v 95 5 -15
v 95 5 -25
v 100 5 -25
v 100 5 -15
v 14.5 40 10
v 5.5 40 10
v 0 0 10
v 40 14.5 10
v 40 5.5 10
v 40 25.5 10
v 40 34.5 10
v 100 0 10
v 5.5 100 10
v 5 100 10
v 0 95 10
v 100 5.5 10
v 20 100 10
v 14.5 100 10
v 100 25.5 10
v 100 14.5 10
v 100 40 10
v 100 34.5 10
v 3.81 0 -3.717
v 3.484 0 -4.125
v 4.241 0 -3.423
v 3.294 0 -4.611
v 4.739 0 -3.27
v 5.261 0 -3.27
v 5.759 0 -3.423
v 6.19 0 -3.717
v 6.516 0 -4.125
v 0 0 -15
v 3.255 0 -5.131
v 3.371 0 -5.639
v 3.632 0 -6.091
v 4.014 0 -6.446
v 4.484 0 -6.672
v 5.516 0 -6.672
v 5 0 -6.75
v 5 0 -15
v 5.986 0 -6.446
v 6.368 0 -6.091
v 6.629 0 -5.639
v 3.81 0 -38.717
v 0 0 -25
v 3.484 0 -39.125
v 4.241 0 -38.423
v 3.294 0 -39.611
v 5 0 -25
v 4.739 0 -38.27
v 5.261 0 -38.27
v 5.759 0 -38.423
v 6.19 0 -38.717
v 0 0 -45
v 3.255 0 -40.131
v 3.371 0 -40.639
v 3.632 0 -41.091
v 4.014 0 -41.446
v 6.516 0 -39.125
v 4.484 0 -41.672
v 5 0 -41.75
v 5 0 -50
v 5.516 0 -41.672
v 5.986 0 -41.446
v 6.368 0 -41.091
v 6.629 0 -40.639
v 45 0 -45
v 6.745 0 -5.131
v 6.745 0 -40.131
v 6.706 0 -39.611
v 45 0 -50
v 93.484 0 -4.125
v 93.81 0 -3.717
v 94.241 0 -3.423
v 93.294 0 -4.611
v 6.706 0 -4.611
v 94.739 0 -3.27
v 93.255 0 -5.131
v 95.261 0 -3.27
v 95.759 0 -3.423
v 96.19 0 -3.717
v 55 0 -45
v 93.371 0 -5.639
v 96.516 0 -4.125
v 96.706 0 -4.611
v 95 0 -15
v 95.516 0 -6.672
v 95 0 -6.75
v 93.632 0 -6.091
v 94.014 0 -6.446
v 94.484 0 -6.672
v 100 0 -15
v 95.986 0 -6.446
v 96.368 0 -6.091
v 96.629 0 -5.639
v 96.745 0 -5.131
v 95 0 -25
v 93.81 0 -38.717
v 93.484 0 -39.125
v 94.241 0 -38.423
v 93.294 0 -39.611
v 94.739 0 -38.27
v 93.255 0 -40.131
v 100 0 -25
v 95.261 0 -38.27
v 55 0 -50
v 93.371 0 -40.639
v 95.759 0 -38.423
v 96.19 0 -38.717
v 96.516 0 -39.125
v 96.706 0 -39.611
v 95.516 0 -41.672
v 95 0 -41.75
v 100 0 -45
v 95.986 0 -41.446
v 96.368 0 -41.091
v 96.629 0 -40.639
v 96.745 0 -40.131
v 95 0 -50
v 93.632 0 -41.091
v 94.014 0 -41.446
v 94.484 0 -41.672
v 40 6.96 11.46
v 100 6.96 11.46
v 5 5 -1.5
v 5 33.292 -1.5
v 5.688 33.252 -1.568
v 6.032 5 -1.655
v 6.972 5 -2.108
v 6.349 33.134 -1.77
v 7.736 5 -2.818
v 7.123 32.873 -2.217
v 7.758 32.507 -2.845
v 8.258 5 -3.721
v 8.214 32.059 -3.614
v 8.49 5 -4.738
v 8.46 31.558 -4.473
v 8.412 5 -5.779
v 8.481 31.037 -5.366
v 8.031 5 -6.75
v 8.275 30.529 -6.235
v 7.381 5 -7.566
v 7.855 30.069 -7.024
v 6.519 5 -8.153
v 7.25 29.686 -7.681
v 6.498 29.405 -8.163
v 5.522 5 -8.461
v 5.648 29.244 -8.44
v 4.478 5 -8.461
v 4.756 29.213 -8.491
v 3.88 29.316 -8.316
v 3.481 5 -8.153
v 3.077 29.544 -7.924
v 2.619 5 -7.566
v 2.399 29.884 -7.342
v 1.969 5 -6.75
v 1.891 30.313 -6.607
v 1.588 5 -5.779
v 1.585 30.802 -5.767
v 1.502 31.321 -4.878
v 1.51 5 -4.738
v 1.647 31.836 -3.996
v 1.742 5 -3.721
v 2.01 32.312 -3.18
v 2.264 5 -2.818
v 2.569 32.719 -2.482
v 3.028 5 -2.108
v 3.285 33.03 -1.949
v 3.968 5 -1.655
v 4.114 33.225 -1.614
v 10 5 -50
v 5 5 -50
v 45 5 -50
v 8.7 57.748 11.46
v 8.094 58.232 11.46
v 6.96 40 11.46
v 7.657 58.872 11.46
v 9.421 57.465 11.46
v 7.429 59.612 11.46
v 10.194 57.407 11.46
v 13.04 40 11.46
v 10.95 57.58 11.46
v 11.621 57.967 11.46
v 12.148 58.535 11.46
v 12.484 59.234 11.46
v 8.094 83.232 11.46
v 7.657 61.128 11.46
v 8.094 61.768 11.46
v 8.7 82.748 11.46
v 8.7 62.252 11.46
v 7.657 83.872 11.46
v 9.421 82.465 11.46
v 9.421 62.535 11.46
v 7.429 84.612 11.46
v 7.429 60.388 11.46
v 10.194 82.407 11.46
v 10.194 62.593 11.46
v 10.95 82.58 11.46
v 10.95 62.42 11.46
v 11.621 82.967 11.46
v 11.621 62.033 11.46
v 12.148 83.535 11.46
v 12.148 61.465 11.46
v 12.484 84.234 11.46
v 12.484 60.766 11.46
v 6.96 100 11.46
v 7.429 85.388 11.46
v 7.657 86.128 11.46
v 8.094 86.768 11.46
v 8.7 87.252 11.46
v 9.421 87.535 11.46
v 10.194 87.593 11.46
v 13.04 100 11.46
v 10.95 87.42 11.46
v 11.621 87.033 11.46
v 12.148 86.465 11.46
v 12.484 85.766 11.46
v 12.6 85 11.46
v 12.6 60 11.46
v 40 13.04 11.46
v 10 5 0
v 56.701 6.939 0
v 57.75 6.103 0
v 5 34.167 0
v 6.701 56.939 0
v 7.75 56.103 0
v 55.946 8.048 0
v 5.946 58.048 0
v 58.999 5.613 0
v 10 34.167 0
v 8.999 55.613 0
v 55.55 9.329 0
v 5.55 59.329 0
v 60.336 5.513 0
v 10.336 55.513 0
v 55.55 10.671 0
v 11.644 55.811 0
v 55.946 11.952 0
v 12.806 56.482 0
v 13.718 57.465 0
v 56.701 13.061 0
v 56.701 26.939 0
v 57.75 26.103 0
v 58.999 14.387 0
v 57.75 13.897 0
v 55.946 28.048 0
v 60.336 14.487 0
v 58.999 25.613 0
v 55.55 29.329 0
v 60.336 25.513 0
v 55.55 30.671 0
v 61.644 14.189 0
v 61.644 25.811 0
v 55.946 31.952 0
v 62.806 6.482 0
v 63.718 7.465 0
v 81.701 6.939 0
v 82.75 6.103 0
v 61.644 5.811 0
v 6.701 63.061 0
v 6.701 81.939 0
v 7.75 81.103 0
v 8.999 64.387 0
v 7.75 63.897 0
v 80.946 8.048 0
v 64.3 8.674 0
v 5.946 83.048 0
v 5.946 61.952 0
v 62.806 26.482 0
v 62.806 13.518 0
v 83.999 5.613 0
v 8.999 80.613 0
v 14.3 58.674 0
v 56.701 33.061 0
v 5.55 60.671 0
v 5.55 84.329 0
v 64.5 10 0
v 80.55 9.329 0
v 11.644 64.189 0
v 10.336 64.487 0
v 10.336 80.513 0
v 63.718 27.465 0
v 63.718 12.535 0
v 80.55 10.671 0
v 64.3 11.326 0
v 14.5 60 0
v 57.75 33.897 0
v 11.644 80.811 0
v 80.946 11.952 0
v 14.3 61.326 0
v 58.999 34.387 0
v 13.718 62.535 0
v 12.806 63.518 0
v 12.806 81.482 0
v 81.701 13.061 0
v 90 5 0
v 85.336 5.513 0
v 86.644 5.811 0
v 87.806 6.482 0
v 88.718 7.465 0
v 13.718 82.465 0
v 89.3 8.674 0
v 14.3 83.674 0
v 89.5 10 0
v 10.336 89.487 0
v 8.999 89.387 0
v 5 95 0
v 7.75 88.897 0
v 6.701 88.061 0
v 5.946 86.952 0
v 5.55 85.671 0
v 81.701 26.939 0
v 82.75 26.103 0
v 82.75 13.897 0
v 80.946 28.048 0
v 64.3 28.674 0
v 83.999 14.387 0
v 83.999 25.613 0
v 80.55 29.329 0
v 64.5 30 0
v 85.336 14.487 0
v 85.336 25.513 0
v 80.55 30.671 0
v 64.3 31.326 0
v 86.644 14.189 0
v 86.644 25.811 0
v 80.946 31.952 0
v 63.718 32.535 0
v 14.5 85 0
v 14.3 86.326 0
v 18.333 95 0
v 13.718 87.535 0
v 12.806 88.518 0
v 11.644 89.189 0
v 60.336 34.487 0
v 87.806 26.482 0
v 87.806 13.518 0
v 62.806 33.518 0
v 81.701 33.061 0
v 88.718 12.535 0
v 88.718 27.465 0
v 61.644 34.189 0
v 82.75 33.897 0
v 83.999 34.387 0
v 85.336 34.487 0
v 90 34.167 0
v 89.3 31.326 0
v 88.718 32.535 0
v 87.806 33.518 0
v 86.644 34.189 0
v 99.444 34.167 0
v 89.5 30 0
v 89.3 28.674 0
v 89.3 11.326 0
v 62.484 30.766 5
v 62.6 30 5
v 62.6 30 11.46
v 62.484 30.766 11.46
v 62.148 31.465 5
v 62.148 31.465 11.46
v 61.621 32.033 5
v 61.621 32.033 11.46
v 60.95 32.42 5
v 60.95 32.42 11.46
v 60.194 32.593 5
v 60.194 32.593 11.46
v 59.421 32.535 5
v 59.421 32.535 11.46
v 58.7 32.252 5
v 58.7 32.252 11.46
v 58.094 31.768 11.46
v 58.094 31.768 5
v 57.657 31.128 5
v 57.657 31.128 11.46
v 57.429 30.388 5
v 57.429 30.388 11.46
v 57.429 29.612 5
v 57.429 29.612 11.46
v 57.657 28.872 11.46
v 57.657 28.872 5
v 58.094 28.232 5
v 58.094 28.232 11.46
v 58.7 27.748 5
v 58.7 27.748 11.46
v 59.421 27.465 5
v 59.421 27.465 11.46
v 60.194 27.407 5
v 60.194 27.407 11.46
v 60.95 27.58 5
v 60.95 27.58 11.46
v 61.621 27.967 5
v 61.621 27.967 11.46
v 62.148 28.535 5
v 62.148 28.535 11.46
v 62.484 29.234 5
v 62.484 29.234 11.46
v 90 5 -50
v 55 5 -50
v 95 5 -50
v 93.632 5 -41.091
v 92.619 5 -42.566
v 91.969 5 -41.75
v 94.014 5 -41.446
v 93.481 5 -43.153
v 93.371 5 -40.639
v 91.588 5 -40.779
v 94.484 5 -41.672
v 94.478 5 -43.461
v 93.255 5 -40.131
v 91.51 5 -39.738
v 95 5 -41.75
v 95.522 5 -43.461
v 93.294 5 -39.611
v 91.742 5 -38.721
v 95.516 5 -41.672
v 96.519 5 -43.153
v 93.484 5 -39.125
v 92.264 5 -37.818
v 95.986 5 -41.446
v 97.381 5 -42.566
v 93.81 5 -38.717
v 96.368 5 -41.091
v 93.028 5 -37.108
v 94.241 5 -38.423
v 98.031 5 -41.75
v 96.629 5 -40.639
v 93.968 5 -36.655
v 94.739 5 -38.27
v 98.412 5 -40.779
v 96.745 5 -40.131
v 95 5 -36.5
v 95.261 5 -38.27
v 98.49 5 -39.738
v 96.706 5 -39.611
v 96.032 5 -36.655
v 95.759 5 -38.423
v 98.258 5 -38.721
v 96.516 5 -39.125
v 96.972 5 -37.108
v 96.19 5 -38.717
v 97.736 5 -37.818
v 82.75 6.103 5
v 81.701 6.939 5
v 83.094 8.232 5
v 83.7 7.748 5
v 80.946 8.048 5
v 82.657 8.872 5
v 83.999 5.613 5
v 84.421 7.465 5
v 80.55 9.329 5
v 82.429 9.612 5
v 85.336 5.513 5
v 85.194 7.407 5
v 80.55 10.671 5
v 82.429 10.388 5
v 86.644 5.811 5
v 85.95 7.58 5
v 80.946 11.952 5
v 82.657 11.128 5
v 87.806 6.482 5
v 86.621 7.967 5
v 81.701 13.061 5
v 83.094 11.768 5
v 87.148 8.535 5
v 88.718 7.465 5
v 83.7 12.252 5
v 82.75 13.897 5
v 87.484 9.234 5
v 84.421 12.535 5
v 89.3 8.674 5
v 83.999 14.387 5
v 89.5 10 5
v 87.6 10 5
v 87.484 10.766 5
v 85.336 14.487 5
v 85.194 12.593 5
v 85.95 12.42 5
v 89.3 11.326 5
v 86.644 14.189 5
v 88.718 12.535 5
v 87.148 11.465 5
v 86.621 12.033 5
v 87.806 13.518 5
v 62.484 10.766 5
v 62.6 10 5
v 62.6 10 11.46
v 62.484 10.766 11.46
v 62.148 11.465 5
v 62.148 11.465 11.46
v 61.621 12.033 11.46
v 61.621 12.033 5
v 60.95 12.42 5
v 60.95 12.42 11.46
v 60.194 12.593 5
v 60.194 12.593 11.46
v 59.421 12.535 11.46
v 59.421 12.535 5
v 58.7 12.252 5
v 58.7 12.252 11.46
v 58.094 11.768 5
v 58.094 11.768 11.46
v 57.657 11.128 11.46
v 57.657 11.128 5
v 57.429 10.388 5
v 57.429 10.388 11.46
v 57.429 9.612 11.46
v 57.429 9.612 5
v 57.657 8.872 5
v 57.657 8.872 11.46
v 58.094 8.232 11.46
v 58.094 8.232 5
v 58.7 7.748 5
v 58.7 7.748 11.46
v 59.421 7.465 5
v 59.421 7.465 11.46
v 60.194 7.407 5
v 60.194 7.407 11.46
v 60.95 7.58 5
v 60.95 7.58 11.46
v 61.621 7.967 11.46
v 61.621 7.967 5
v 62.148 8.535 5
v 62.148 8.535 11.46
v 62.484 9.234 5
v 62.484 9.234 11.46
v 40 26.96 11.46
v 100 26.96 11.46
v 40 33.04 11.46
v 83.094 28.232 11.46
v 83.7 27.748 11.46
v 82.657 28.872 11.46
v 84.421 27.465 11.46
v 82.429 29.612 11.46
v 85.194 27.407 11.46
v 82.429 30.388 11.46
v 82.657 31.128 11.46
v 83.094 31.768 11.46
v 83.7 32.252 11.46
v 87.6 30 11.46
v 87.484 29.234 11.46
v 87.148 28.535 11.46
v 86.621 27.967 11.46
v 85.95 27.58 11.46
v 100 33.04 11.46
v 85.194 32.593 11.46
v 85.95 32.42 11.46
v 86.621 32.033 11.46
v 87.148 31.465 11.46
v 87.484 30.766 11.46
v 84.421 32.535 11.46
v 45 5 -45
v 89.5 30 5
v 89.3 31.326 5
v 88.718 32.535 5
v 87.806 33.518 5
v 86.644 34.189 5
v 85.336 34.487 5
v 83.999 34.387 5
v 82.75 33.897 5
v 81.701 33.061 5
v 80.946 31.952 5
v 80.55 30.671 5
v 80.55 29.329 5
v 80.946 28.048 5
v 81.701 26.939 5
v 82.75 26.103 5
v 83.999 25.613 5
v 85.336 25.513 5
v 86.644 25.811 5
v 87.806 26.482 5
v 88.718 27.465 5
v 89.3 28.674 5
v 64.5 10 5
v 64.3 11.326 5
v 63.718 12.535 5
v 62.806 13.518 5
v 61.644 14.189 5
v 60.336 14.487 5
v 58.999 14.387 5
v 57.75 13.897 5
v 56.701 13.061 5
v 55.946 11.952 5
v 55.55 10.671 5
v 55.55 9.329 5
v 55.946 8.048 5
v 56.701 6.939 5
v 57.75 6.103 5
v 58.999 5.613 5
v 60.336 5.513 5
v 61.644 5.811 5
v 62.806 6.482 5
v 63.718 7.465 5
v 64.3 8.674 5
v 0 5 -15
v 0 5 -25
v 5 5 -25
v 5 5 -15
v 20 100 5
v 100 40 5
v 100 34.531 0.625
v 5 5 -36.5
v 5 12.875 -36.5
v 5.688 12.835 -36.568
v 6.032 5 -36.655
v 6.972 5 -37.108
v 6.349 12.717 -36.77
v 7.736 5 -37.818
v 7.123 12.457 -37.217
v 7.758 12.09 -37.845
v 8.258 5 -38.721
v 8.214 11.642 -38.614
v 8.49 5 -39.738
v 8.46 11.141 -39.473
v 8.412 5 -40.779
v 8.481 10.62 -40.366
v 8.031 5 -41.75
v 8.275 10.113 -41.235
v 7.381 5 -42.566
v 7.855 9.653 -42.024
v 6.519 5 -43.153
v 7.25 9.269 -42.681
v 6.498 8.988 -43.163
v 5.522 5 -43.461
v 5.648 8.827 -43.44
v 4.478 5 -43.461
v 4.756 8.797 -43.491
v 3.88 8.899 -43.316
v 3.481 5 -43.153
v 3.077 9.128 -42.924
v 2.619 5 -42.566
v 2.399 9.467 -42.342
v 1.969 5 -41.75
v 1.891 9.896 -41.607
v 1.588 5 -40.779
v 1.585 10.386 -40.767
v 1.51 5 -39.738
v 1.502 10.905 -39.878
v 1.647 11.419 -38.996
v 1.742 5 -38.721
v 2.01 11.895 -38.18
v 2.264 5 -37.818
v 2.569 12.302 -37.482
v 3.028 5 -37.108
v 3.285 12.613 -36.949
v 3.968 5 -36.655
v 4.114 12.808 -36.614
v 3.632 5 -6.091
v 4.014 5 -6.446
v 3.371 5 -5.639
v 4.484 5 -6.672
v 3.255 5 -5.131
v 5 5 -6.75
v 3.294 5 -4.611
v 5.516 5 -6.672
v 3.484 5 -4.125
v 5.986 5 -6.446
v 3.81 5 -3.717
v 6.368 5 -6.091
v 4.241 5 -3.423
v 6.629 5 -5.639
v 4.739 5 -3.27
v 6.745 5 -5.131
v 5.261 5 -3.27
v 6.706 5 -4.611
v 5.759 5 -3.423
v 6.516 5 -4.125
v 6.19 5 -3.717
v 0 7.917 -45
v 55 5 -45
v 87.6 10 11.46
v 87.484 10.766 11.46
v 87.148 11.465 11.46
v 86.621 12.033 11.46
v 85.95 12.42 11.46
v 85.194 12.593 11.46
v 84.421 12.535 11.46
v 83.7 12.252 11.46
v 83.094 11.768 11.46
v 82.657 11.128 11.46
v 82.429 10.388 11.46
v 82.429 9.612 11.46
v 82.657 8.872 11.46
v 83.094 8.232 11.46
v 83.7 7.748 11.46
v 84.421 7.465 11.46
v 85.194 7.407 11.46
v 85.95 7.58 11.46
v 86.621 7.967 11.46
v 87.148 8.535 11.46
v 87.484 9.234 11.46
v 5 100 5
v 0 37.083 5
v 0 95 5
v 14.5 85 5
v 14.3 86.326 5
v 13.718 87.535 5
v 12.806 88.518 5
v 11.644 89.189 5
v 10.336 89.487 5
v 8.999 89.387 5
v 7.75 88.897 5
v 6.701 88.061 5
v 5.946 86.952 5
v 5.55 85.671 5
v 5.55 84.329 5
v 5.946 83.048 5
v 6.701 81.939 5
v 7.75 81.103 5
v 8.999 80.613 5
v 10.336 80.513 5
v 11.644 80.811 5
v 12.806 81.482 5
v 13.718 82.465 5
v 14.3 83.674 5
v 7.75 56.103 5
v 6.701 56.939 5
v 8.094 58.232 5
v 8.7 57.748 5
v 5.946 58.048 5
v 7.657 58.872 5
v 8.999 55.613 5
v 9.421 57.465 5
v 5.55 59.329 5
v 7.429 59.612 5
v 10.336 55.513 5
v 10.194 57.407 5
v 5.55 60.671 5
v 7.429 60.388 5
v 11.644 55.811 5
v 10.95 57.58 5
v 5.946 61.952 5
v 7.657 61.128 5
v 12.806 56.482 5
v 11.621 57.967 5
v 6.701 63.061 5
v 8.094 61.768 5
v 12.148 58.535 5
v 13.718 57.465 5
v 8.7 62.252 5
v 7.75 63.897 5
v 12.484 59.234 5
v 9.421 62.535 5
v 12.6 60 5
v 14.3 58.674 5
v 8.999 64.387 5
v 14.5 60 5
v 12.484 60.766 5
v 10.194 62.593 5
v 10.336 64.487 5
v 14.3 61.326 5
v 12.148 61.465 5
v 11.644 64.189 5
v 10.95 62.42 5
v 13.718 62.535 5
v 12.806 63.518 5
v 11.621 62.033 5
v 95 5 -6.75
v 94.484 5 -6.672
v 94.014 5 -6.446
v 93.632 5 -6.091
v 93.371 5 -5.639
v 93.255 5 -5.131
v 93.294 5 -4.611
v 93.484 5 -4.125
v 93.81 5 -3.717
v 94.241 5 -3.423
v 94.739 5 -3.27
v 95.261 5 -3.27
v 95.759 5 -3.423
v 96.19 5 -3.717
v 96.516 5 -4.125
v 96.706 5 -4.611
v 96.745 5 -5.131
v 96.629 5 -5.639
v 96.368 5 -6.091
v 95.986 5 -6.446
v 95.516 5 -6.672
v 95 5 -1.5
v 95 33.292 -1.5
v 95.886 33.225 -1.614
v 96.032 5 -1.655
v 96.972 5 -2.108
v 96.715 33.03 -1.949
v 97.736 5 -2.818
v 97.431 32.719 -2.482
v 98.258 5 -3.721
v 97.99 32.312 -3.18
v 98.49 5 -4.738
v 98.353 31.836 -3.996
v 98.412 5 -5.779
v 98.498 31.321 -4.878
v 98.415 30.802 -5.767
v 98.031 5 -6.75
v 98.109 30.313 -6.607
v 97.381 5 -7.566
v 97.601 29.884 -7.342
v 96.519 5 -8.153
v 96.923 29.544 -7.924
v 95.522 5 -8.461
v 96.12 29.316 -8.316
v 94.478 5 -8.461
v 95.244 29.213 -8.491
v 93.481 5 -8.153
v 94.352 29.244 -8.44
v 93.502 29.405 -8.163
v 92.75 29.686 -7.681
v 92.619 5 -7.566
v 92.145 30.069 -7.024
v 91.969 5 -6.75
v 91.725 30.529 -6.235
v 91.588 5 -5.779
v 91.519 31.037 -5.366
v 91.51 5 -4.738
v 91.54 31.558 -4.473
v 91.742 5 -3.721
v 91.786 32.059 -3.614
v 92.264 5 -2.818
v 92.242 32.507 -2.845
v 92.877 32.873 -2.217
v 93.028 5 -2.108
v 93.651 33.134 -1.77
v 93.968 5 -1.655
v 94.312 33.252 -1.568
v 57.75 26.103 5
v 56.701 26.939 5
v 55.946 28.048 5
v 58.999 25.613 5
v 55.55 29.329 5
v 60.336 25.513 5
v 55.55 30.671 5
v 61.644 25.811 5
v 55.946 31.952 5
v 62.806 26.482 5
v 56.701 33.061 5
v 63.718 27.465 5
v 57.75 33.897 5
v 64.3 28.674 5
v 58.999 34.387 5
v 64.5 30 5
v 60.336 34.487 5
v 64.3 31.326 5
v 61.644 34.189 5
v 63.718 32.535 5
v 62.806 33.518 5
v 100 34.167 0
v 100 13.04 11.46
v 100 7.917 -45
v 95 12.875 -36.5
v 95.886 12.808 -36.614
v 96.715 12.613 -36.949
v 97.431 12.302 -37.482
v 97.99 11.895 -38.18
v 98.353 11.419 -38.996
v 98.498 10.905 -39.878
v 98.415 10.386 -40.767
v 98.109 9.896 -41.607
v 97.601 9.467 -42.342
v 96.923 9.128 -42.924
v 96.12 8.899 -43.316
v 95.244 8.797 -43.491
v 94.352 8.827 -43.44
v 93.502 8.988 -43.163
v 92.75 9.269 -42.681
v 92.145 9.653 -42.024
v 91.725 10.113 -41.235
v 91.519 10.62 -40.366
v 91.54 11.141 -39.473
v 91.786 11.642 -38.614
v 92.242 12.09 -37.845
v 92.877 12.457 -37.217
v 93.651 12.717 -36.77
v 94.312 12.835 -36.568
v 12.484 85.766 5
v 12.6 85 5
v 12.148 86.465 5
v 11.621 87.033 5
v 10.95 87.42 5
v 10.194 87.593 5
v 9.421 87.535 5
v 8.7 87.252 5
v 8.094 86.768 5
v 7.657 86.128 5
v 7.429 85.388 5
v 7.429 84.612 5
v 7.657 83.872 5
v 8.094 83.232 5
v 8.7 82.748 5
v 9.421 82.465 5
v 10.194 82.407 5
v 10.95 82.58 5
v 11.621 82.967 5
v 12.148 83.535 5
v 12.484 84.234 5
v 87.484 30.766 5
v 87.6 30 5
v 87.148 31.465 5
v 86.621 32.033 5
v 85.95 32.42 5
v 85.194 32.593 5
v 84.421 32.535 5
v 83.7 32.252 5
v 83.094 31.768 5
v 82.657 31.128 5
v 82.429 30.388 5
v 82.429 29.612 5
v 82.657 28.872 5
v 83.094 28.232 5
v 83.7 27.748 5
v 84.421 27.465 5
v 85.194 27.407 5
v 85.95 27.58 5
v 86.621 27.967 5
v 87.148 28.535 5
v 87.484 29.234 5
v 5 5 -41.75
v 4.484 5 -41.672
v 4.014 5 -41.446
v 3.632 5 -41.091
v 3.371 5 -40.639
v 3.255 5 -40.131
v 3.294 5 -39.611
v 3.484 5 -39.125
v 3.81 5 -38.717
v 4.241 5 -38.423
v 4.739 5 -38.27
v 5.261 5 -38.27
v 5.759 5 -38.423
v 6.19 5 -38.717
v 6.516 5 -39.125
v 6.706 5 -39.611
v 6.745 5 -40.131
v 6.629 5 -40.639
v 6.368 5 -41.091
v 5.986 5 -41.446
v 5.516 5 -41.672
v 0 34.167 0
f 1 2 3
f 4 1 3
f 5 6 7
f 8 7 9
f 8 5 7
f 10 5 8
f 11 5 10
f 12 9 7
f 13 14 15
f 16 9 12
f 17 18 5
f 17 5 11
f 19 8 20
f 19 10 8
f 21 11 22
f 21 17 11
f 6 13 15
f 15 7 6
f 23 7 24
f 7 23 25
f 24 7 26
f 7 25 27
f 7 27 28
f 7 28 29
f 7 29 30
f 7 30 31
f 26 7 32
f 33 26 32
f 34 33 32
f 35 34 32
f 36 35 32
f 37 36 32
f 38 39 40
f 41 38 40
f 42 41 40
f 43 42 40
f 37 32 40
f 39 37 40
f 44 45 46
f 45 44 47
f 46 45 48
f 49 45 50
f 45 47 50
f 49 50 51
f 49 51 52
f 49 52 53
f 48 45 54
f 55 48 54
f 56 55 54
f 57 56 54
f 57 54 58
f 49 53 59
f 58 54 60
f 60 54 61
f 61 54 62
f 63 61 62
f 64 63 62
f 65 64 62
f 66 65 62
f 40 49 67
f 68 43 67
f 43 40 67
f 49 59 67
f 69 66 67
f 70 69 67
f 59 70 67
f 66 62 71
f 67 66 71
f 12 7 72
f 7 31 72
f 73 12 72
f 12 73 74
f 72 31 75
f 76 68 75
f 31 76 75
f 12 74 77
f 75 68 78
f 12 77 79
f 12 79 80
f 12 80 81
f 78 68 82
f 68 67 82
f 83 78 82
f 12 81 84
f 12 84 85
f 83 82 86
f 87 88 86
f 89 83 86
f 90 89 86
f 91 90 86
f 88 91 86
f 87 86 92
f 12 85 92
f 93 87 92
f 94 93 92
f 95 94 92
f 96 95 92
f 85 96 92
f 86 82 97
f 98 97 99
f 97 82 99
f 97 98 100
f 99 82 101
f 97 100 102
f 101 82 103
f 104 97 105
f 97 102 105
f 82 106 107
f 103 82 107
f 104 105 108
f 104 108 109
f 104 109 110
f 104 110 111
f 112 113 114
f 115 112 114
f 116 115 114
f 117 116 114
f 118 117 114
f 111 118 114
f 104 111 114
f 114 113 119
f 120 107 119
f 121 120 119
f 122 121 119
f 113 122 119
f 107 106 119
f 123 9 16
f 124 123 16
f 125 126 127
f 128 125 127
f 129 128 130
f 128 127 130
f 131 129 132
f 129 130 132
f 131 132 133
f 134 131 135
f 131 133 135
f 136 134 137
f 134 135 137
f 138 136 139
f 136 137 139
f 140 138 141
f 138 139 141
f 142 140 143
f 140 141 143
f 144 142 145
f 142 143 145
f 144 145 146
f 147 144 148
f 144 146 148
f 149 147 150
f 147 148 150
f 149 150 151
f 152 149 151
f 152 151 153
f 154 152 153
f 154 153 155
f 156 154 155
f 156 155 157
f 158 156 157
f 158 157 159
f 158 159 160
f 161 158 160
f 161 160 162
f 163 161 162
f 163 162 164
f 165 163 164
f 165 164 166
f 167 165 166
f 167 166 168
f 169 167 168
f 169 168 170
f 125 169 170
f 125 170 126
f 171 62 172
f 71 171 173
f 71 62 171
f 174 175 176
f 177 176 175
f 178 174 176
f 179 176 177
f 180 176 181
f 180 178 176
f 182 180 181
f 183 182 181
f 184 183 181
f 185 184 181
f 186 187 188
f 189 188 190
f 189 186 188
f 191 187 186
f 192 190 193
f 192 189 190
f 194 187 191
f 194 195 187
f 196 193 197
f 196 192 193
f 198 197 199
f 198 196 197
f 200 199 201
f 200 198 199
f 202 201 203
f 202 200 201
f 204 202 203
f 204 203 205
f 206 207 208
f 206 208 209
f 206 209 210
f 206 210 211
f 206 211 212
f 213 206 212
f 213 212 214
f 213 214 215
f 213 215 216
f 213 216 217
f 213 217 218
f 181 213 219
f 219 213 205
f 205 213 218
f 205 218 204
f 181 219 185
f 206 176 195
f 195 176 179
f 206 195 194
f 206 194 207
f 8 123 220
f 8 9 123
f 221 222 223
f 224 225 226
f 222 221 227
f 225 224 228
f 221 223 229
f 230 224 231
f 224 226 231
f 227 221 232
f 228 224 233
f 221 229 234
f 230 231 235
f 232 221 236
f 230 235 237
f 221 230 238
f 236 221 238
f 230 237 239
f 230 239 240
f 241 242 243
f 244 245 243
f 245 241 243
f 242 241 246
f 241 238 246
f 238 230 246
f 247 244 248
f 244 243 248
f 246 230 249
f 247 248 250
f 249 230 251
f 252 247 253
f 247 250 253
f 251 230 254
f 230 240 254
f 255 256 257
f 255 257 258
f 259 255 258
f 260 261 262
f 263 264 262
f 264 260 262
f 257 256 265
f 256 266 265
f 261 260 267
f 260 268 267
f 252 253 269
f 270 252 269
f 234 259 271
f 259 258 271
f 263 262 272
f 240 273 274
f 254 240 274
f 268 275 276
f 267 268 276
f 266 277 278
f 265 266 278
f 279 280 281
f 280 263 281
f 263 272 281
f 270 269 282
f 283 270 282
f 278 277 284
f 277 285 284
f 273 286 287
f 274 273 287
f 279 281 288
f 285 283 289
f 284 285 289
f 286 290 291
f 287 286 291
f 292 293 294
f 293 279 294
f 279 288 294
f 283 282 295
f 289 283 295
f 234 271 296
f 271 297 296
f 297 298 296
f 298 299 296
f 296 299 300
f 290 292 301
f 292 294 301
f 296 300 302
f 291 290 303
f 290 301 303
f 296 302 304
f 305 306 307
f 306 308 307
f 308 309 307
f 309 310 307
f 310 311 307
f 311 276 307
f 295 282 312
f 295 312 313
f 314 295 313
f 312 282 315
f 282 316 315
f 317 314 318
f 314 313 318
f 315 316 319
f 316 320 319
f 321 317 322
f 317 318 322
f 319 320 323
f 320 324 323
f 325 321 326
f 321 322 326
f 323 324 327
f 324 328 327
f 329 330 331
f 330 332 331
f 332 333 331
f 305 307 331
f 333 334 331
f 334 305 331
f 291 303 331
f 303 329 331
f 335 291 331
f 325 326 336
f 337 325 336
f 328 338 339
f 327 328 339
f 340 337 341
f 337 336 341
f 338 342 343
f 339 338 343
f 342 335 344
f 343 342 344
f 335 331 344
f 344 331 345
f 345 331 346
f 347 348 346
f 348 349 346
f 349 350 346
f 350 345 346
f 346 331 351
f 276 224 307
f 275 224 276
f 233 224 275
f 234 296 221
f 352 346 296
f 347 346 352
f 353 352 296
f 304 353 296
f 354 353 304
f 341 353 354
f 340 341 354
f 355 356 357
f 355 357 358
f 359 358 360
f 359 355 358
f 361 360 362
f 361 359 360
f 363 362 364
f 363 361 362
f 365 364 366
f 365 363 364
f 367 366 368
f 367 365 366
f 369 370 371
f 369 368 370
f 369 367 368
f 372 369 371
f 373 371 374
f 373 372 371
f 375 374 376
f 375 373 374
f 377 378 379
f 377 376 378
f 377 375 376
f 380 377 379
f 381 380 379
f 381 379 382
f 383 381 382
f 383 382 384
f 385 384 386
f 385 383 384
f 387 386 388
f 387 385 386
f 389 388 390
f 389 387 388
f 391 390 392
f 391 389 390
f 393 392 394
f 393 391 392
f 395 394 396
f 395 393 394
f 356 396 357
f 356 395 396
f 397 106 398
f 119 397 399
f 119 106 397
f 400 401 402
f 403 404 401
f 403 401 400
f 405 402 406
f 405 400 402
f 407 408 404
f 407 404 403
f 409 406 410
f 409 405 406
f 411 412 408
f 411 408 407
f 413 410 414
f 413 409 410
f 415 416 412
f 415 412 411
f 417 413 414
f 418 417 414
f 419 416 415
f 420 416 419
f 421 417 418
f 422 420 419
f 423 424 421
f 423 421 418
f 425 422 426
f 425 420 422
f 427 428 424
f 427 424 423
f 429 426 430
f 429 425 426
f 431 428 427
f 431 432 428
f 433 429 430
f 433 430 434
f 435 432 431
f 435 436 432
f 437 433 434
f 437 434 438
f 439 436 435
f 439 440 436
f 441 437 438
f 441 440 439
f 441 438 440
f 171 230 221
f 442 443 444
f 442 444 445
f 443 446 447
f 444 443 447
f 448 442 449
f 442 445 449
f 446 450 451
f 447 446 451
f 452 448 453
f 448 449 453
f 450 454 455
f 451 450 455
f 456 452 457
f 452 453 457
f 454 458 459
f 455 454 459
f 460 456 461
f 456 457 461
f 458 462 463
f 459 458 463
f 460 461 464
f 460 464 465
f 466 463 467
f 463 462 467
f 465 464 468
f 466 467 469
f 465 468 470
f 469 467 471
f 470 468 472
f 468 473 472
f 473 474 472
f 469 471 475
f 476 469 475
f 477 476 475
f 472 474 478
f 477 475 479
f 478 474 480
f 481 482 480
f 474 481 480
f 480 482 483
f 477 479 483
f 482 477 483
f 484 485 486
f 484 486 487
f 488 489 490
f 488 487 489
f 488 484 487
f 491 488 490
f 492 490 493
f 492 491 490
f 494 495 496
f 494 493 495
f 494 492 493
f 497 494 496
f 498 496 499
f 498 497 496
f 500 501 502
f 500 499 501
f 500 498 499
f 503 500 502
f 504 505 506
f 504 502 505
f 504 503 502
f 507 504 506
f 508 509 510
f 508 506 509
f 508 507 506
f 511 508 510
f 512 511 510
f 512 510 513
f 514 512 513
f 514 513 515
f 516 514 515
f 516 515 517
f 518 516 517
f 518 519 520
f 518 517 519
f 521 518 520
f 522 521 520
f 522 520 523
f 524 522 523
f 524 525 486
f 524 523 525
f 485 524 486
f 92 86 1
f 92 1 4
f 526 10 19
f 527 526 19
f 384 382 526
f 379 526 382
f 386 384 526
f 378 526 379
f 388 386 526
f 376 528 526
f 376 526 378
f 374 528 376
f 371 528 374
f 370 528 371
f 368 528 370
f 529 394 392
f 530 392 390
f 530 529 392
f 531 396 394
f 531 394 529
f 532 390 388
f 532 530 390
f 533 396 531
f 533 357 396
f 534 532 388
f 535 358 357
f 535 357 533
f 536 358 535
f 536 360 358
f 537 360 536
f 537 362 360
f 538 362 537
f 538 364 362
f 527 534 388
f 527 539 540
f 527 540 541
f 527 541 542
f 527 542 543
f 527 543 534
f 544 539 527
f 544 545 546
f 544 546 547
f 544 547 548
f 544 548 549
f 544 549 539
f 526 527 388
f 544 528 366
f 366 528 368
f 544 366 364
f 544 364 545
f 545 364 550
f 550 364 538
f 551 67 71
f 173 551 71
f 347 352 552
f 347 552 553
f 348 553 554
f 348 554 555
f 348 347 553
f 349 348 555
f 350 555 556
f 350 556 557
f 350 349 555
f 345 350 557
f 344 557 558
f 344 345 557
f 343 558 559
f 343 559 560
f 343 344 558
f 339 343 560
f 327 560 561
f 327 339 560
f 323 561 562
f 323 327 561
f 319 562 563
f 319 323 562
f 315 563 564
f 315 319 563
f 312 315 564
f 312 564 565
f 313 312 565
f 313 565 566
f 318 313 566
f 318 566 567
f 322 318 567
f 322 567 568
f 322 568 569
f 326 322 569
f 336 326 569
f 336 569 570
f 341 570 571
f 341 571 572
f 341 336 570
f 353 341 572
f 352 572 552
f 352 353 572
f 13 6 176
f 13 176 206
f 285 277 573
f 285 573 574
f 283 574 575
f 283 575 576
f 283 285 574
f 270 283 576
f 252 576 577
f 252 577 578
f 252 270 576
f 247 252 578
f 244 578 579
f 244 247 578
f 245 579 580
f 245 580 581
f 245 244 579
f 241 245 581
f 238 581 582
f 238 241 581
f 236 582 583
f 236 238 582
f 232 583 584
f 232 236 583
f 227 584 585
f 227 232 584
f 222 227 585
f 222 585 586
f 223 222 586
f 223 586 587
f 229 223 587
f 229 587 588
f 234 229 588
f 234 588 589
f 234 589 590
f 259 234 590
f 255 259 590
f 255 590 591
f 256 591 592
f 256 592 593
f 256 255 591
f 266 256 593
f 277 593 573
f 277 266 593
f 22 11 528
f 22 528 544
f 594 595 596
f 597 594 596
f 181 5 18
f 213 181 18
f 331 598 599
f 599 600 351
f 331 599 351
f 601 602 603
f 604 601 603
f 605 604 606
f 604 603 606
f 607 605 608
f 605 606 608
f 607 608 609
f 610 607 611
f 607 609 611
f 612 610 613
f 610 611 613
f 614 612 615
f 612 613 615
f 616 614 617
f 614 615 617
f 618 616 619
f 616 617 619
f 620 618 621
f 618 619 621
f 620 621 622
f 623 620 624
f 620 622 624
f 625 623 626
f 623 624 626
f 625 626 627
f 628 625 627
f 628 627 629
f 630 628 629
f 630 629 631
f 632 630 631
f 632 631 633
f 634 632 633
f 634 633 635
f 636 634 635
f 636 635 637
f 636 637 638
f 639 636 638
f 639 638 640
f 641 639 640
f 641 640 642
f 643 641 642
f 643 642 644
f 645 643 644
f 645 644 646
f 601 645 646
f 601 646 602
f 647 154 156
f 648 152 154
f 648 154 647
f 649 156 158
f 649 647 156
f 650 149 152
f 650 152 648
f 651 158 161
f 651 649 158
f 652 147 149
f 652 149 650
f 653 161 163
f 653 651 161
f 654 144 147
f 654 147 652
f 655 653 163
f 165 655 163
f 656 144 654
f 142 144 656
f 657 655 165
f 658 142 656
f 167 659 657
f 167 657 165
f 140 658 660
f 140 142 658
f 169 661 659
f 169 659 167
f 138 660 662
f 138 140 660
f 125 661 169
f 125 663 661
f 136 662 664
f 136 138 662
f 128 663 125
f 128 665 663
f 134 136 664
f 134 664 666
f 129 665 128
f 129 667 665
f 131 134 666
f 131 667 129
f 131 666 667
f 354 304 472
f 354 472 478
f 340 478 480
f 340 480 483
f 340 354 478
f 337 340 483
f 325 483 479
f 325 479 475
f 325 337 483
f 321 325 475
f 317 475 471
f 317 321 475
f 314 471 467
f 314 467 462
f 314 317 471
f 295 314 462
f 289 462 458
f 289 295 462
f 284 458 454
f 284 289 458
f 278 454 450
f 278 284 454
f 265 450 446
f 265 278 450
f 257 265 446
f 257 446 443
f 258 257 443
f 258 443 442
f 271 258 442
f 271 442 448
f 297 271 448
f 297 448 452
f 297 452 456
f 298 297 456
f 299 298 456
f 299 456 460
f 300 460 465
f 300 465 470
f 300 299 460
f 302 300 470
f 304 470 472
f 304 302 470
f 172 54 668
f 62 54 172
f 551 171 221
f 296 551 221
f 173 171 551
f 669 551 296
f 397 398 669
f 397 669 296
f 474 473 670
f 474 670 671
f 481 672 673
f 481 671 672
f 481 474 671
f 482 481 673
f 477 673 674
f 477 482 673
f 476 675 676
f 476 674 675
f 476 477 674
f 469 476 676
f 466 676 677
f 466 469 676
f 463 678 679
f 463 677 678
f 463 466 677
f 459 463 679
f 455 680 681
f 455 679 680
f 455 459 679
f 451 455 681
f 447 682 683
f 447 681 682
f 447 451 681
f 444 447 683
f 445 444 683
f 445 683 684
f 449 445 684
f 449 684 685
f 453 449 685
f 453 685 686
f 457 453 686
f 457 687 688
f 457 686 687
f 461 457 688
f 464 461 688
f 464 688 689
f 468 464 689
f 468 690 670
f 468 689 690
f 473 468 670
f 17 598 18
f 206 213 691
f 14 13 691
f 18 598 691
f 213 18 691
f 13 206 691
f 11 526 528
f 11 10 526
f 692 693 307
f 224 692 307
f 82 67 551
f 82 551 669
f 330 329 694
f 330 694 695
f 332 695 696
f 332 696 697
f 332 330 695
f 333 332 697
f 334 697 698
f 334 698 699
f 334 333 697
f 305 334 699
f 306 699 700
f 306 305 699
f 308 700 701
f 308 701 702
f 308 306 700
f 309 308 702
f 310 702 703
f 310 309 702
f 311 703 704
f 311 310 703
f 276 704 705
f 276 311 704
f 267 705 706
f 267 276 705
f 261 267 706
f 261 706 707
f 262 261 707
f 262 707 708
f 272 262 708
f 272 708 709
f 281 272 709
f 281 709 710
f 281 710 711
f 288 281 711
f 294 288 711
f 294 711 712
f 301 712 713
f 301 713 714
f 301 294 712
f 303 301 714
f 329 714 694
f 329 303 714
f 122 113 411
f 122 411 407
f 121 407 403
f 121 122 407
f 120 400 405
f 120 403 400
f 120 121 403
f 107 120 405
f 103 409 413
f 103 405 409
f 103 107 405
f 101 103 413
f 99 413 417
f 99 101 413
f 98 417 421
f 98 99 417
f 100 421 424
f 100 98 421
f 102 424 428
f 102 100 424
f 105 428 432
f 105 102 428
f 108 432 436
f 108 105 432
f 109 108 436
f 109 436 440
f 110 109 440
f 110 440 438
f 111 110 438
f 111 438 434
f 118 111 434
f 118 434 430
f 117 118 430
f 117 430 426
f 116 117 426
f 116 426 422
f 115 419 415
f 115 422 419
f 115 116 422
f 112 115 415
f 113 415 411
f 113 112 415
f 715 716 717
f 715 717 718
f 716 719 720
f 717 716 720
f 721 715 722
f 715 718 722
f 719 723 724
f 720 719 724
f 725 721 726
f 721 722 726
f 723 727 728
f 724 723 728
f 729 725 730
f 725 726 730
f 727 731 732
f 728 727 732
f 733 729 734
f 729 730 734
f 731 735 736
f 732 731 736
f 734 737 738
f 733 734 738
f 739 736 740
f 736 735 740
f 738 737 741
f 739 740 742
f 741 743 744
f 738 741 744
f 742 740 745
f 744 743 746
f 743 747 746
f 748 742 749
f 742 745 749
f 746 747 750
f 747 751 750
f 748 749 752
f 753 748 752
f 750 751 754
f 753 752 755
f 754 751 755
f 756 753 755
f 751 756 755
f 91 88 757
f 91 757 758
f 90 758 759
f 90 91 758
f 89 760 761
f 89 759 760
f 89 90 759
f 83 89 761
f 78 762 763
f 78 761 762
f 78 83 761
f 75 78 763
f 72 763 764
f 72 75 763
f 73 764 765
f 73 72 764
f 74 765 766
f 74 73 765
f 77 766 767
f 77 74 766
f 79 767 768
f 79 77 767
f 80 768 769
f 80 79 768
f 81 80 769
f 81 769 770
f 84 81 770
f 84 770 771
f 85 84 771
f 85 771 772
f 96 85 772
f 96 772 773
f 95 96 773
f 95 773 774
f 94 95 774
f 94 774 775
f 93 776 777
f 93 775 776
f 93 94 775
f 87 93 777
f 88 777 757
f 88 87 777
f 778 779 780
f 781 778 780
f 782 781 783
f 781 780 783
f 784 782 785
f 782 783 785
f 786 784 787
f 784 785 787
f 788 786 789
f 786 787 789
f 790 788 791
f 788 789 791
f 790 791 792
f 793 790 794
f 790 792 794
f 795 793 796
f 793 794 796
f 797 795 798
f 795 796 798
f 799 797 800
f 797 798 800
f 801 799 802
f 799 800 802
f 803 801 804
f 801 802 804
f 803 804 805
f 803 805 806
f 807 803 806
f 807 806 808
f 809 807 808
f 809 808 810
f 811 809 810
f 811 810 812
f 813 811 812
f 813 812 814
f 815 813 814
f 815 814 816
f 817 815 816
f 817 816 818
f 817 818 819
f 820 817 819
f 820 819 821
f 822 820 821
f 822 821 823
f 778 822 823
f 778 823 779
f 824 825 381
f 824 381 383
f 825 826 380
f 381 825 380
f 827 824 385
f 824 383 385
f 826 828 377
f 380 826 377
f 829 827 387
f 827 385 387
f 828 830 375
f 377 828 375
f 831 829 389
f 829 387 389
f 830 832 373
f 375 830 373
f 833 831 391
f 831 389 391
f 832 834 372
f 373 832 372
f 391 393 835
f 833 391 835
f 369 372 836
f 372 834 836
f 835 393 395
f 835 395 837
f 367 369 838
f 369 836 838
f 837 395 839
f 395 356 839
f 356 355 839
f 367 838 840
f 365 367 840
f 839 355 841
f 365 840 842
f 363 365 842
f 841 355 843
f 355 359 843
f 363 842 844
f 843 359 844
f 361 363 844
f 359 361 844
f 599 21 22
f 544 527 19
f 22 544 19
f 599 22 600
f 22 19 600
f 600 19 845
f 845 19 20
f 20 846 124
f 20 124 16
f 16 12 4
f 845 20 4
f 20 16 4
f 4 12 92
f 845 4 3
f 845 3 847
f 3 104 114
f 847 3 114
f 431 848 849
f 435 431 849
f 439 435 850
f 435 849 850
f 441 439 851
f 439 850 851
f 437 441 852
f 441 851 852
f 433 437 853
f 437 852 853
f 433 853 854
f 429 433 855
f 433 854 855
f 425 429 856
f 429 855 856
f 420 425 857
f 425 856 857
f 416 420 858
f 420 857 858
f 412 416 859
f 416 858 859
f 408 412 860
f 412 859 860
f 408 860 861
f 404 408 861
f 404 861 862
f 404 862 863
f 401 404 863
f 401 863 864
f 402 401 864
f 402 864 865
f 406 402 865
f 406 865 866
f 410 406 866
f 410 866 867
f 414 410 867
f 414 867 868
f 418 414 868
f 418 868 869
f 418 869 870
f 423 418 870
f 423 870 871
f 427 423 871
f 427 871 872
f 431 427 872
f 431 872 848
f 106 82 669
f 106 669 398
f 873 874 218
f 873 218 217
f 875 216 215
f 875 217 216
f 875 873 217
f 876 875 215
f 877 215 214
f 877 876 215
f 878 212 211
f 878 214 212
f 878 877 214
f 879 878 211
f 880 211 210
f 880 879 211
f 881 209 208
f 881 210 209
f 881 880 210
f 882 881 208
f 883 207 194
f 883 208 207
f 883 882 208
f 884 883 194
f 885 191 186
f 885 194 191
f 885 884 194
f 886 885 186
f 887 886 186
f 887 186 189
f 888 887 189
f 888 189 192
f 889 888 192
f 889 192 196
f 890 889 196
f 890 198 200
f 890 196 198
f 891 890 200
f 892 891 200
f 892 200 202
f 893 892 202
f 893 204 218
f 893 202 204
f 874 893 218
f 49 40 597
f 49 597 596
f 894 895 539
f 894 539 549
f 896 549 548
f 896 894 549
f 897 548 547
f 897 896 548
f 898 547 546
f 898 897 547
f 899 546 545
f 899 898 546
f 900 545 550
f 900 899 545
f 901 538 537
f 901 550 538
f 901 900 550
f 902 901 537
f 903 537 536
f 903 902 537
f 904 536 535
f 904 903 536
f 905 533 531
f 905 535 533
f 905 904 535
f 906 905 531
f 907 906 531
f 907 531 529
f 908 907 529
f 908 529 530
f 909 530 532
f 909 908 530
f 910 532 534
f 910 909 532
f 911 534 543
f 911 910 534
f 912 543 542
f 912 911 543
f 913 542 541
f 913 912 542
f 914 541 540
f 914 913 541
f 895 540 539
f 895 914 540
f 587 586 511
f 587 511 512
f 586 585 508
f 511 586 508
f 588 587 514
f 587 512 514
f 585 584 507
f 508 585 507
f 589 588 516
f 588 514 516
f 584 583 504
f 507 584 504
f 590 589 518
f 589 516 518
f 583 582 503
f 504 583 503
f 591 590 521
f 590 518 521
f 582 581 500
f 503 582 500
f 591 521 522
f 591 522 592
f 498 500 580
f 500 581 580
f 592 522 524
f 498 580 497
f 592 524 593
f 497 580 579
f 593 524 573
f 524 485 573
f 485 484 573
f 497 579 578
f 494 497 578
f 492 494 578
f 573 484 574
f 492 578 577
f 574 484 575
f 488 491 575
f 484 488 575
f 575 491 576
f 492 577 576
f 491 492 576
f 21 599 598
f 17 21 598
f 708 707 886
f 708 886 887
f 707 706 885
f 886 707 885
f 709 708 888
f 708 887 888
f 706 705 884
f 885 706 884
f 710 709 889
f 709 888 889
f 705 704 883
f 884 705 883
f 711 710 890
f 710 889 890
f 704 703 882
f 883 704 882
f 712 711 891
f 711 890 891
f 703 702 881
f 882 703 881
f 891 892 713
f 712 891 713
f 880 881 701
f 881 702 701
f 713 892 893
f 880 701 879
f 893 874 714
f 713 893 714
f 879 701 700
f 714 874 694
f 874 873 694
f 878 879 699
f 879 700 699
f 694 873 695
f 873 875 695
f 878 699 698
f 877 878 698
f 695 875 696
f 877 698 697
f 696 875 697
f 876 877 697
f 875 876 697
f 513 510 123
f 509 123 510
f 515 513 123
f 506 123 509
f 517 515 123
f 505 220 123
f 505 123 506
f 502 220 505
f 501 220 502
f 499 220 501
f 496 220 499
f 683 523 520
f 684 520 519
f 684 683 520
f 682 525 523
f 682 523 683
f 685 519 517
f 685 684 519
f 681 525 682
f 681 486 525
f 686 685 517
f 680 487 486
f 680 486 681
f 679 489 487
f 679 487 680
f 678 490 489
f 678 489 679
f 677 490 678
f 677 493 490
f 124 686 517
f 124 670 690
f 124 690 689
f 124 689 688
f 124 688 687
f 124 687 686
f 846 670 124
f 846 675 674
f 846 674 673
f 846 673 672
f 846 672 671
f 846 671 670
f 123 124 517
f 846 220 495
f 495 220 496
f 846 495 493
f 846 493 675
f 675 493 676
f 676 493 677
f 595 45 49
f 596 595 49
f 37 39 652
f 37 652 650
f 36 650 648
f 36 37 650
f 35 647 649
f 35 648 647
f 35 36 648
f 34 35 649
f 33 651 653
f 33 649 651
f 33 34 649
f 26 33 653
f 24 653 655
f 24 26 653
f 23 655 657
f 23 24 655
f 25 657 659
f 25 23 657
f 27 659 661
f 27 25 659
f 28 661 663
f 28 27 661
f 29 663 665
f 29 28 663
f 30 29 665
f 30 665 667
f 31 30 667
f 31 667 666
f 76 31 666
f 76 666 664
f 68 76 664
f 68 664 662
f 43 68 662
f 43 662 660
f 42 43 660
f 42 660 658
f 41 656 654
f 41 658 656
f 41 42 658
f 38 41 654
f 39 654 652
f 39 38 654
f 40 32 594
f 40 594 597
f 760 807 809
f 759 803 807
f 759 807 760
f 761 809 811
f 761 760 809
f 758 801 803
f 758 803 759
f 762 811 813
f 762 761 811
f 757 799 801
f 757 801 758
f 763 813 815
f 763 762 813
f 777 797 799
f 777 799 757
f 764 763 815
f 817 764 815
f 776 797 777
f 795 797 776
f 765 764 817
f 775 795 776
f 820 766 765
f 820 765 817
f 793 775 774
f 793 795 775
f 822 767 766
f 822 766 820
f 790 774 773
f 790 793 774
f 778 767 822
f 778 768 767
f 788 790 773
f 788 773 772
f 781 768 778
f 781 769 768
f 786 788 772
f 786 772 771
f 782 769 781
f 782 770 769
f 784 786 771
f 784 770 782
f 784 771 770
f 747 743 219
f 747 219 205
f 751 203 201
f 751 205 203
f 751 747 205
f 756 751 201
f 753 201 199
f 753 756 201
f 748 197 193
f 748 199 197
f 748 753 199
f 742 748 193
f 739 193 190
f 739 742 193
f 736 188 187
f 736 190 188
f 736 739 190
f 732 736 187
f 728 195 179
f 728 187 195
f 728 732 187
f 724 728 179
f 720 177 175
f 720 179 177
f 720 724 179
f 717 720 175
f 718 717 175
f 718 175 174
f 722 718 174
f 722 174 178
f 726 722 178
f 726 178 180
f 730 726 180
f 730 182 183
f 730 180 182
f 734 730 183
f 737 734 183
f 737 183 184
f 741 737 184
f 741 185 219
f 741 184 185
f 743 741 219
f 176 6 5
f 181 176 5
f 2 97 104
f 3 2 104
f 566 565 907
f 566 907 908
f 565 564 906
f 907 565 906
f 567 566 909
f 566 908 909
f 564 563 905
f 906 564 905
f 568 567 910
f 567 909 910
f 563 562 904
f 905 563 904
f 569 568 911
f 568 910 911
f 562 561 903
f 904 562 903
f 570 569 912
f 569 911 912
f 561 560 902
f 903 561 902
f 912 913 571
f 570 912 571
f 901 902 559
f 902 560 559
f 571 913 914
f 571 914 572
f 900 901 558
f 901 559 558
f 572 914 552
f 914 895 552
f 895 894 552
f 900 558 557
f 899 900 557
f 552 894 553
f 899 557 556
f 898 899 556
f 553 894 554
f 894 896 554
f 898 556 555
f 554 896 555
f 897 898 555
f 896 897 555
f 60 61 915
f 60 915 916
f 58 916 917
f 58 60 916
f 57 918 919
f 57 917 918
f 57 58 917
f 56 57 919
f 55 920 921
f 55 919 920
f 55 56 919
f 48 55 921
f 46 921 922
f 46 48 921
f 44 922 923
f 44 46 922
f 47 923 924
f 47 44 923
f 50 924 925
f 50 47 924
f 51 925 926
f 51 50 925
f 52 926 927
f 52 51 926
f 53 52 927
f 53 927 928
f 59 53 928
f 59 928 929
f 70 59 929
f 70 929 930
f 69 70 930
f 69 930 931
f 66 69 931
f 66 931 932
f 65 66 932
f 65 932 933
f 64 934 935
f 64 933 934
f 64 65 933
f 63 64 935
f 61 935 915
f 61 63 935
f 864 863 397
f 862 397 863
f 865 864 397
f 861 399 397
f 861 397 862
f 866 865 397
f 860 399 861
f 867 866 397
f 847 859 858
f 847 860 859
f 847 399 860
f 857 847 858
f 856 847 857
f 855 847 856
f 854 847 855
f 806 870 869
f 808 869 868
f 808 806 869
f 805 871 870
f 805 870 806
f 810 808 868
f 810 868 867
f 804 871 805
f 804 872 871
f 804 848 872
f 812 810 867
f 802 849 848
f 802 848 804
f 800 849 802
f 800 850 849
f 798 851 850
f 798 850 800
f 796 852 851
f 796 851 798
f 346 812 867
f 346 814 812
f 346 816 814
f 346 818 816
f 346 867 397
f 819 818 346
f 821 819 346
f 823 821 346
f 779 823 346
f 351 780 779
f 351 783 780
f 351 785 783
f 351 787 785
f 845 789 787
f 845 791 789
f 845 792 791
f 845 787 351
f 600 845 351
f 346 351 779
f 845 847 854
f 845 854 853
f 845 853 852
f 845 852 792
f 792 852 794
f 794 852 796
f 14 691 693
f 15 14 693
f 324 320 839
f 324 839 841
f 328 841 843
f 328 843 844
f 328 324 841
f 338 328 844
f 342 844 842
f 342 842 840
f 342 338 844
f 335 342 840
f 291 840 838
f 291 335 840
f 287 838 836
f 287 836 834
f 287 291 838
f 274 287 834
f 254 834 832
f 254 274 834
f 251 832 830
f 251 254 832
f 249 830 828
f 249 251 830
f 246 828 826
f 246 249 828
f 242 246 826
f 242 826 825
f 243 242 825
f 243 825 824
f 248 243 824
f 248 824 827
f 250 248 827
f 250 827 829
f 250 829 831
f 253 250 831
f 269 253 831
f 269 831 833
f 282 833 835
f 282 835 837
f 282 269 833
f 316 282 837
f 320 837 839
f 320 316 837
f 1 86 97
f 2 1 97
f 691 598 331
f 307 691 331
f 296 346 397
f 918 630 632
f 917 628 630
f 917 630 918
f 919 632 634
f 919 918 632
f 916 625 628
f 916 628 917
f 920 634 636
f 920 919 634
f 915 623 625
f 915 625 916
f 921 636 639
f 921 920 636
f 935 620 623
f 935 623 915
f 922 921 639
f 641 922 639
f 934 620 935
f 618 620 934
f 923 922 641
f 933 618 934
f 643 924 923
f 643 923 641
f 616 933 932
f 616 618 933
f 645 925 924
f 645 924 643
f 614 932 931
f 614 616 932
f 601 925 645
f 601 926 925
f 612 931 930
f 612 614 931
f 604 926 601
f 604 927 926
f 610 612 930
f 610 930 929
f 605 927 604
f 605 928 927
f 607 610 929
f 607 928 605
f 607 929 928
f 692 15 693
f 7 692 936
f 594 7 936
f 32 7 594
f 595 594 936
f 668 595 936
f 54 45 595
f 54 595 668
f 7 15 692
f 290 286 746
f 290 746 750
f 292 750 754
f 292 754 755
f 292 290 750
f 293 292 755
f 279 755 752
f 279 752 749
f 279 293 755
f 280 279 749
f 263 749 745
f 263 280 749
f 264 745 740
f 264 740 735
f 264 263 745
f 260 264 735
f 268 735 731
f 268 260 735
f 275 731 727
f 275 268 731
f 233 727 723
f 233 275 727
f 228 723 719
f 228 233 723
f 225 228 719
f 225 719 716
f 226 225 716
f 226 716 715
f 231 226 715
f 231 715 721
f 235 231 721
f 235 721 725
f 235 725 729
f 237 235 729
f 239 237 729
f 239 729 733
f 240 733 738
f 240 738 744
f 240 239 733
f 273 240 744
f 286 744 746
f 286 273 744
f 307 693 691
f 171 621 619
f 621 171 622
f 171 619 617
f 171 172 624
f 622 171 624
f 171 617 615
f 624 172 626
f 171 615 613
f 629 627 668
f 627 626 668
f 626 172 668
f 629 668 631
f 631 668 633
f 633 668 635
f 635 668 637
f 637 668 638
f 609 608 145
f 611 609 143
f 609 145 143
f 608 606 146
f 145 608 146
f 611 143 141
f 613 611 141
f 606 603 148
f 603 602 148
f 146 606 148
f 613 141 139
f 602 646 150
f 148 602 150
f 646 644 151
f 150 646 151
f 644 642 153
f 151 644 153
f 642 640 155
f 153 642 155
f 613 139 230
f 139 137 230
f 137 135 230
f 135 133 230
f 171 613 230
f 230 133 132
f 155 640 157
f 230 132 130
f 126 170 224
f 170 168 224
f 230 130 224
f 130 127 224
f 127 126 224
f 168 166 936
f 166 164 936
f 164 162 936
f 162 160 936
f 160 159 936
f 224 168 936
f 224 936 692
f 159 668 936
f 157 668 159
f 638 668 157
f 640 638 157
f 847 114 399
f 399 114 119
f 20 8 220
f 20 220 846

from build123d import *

# Parameters (mm, degrees)
BOSS_EXTRUDE1_DEPTH     = 10
SKETCH2_R               = 2.6
CUT_EXTRUDE1_DEPTH      = 142.774468788
BOSS_EXTRUDE3_START     = 10
SKETCH3_W               = 60
SKETCH3_H               = 9
SKETCH3_W_2             = 9
SKETCH3_H_2             = 60
BOSS_EXTRUDE3_DEPTH     = 1.46
CUT_EXTRUDE2_DEPTH      = 142.884923794
CUT_EXTRUDE2_DEPTH_BACK = 142.884923794
SKETCH2_2_R             = 2.6
CHAMFER1_SIZE           = 1.46
SKETCH4_R               = 4.5
CUT_EXTRUDE3_DEPTH      = 5
SKETCH5_W               = 100
SKETCH5_H               = 50
BOSS_EXTRUDE4_DEPTH     = 5
BOSS_EXTRUDE5_DEPTH     = 10
BOSS_EXTRUDE6_START     = 100
BOSS_EXTRUDE6_DEPTH     = 10
CUT_EXTRUDE4_DEPTH      = 151
CUT_EXTRUDE4_DEPTH_BACK = 151
SKETCH10_R              = 1.75
CUT_EXTRUDE5_START      = 100
SKETCH11_R              = 3.5
CUT_EXTRUDE5_DEPTH      = 95
SKETCH12_W              = 5
SKETCH12_H              = 10
SKETCH12_W_2            = 10
SKETCH12_H_2            = 5
CUT_EXTRUDE6_DEPTH      = 5
CHAMFER2_SIZE           = 5


# Some blends are built 0.0001 mm under size
with BuildPart() as part:
    # Sketch1 → Boss-Extrude1 (new body)
    with BuildSketch(Plane.XY):
        Polygon((0, 0), (100, 0), (100, 40), (20, 100), (0, 100), align=None)
    extrude(amount=BOSS_EXTRUDE1_DEPTH)

    # Sketch2 → Cut-Extrude1 (cut, through all)
    with BuildSketch(Plane.XY):
        with Locations((10, 85)):
            Circle(SKETCH2_R)
        with Locations((10, 60)):
            Circle(SKETCH2_R)
        with Locations((85, 30)):
            Circle(SKETCH2_R)
        with Locations((85, 10)):
            Circle(SKETCH2_R)
        with Locations((60, 10)):
            Circle(SKETCH2_R)
        with Locations((60, 30)):
            Circle(SKETCH2_R)
    extrude(amount=CUT_EXTRUDE1_DEPTH, mode=Mode.SUBTRACT)

    # Sketch3 → Boss-Extrude3 (add)
    with BuildSketch(Plane.XY.offset(BOSS_EXTRUDE3_START)):
        with Locations((70, 30)):
            Rectangle(SKETCH3_W, SKETCH3_H)
        with Locations((70, 10)):
            Rectangle(SKETCH3_W, SKETCH3_H)
        with Locations((10, 70)):
            Rectangle(SKETCH3_W_2, SKETCH3_H_2)
    extrude(amount=BOSS_EXTRUDE3_DEPTH)

    # Sketch2<2> → Cut-Extrude2 (cut, two sides: drawn at the far end of the back side and taken through both)
    with BuildSketch(Plane.XY.offset(-CUT_EXTRUDE2_DEPTH_BACK)):
        with Locations((10, 85)):
            Circle(SKETCH2_2_R)
        with Locations((10, 60)):
            Circle(SKETCH2_2_R)
        with Locations((85, 30)):
            Circle(SKETCH2_2_R)
        with Locations((85, 10)):
            Circle(SKETCH2_2_R)
        with Locations((60, 10)):
            Circle(SKETCH2_2_R)
        with Locations((60, 30)):
            Circle(SKETCH2_2_R)
    extrude(amount=CUT_EXTRUDE2_DEPTH + CUT_EXTRUDE2_DEPTH_BACK, mode=Mode.SUBTRACT)

    # Chamfer1
    chamfer1_edges = [part.edges().sort_by_distance(p)[0] for p in [
        (14.5, 70, 11.46),
        (5.5, 70, 11.46),
        (70, 5.5, 11.46),
        (70, 14.5, 11.46),
        (70, 25.5, 11.46),
        (70, 34.5, 11.46),
    ]]
    chamfer(chamfer1_edges, length=CHAMFER1_SIZE - 0.0001)  # a hair under: the kernel refuses the full size

    # Sketch4 → Cut-Extrude3 (cut)
    with BuildSketch(Plane.XY):
        with Locations((10, 85)):
            Circle(SKETCH4_R)
        with Locations((10, 60)):
            Circle(SKETCH4_R)
        with Locations((60, 30)):
            Circle(SKETCH4_R)
        with Locations((85, 30)):
            Circle(SKETCH4_R)
        with Locations((85, 10)):
            Circle(SKETCH4_R)
        with Locations((60, 10)):
            Circle(SKETCH4_R)
    extrude(amount=CUT_EXTRUDE3_DEPTH, mode=Mode.SUBTRACT)

    # Sketch5 → Boss-Extrude4 (add)
    with BuildSketch(Plane(origin=(0, 0, 0), x_dir=(1, 0, 0), z_dir=(0, 1, 0))):
        with Locations((50, 25)):
            Rectangle(SKETCH5_W, SKETCH5_H)
    extrude(amount=BOSS_EXTRUDE4_DEPTH)

    # Sketch8 → Boss-Extrude5 (add)
    with BuildSketch(Plane(origin=(0, 0, 0), x_dir=(0, 0, -1), z_dir=(1, 0, 0))):
        Polygon((-10, 5), (50, 5), (-10, 40), align=None)
    extrude(amount=BOSS_EXTRUDE5_DEPTH)

    # Sketch8<2> → Boss-Extrude6 (add)
    with BuildSketch(Plane(origin=(0, 0, 0), x_dir=(0, 0, -1), z_dir=(1, 0, 0)).offset(BOSS_EXTRUDE6_START)):
        Polygon((-10, 5), (50, 5), (-10, 40), align=None)
    extrude(amount=-BOSS_EXTRUDE6_DEPTH)

    # Sketch10 → Cut-Extrude4 (cut, two sides: drawn at the far end of the back side and taken through both)
    with BuildSketch(Plane(origin=(0, 0, 0), x_dir=(1, 0, 0), z_dir=(0, 1, 0)).offset(-CUT_EXTRUDE4_DEPTH_BACK)):
        with Locations(Location((5, 40, 0), (0, 0, 90))):
            Circle(SKETCH10_R)
        with Locations(Location((95, 40, 0), (0, 0, 90))):
            Circle(SKETCH10_R)
        with Locations(Location((95, 5, 0), (0, 0, 90))):
            Circle(SKETCH10_R)
        with Locations(Location((5, 5, 0), (0, 0, 90))):
            Circle(SKETCH10_R)
    extrude(amount=CUT_EXTRUDE4_DEPTH + CUT_EXTRUDE4_DEPTH_BACK, mode=Mode.SUBTRACT)

    # Sketch11 → Cut-Extrude5 (cut)
    with BuildSketch(Plane(origin=(0, 0, 0), x_dir=(1, 0, 0), z_dir=(0, 1, 0)).offset(CUT_EXTRUDE5_START)):
        with Locations(Location((5, 5, 0), (0, 0, 270))):
            Circle(SKETCH11_R)
        with Locations(Location((5, 40, 0), (0, 0, 270))):
            Circle(SKETCH11_R)
        with Locations(Location((95, 40, 0), (0, 0, 270))):
            Circle(SKETCH11_R)
        with Locations(Location((95, 5, 0), (0, 0, 270))):
            Circle(SKETCH11_R)
    extrude(amount=-CUT_EXTRUDE5_DEPTH, mode=Mode.SUBTRACT)

    # Sketch12 → Cut-Extrude6 (cut)
    with BuildSketch(Plane(origin=(0, 0, 0), x_dir=(1, 0, 0), z_dir=(0, 1, 0))):
        with Locations((97.5, 20)):
            Rectangle(SKETCH12_W, SKETCH12_H)
        with Locations((2.5, 20)):
            Rectangle(SKETCH12_W, SKETCH12_H)
        with Locations((50, 47.5)):
            Rectangle(SKETCH12_W_2, SKETCH12_H_2)
    extrude(amount=CUT_EXTRUDE6_DEPTH, mode=Mode.SUBTRACT)

    # Chamfer2
    # the kernel refuses this chamfer: 5 mm, written as the material it takes off along each edge
    with BuildSketch(Plane(origin=(3.333333333, 96.666666667, 3.333333333), x_dir=(0.7071067811865475, 0.7071067811865476, 0), z_dir=(-0.5773502691896258, 0.5773502691896258, -0.5773502691896258))) as chamfer2_piece_1:
        Polygon((-3.535533906, -2.041241452), (3.535533906, -2.041241452), (0, 4.082482905), align=None)
    extrude(amount=6.350852961, mode=Mode.SUBTRACT)
    with BuildSketch(Plane(origin=(100, -12.85841494, -50), x_dir=(0.0274958766105877, 0, 0.9996219169112968), z_dir=(0, 1, 0))) as chamfer2_piece_2:
        Polygon((CHAMFER2_SIZE * 0.999621916911, -CHAMFER2_SIZE * 0.0274958766106), (-CHAMFER2_SIZE * 0.0274958766106, -CHAMFER2_SIZE * 0.999621916911), (0, 0), align=None)
    extrude(amount=30.71682988, mode=Mode.SUBTRACT)
    with BuildSketch(Plane(origin=(0, -12.85841494, -50), x_dir=(-0.027495876610586372, 0, 0.9996219169112968), z_dir=(0, 1, 0))) as chamfer2_piece_3:
        Polygon((CHAMFER2_SIZE * 0.999621916911, CHAMFER2_SIZE * 0.0274958766106), (-CHAMFER2_SIZE * 0.0274958766106, CHAMFER2_SIZE * 0.999621916911), (0, 0), align=None)
    extrude(amount=30.71682988, mode=Mode.SUBTRACT)
    with BuildSketch(Plane(origin=(0, 100, -12.85841494), x_dir=(0.9996219169112968, 0.0274958766105877, 0), z_dir=(0, 0, 1))) as chamfer2_piece_4:
        Polygon((CHAMFER2_SIZE * 0.999621916911, -CHAMFER2_SIZE * 0.0274958766106), (-CHAMFER2_SIZE * 0.0274958766106, -CHAMFER2_SIZE * 0.999621916911), (0, 0), align=None)
    extrude(amount=35.71682988, mode=Mode.SUBTRACT)
    with BuildSketch(Plane(origin=(110.286731952, 32.284951036, 0), x_dir=(0.016497525966350957, 0.021996701288467948, 0.9996219169112968), z_dir=(-0.8000000000000002, 0.6, 0))) as chamfer2_piece_5_section:
        Polygon((CHAMFER2_SIZE * 0.999621916911, -CHAMFER2_SIZE * 0.0274958766106), (-CHAMFER2_SIZE * 0.0274958766106, -CHAMFER2_SIZE * 0.999621916911), (0, 0), align=None)
    chamfer2_piece_5 = extrude(amount=125.71682988, mode=Mode.PRIVATE)
    chamfer2_piece_5 = split(chamfer2_piece_5, bisect_by=Plane(origin=(58.587038142, 43.71482671, 16.368274359), z_dir=(0, 0.8637789008984335, -0.5038710255240861)), keep=Keep.TOP, mode=Mode.PRIVATE)
    add(chamfer2_piece_5, mode=Mode.SUBTRACT)
    with BuildSketch(Plane(origin=(32.85841494, 100, 0), x_dir=(0, 0.0274958766105877, 0.9996219169112968), z_dir=(-1, 0, 0))) as chamfer2_piece_6:
        Polygon((CHAMFER2_SIZE * 0.999621916911, -CHAMFER2_SIZE * 0.0274958766106), (-CHAMFER2_SIZE * 0.0274958766106, -CHAMFER2_SIZE * 0.999621916911), (0, 0), align=None)
    extrude(amount=45.71682988, mode=Mode.SUBTRACT)
    with BuildSketch(Plane(origin=(0, 112.85841494, 0), x_dir=(-0.02749587661058638, 0, 0.9996219169112968), z_dir=(0, -1, 0))) as chamfer2_piece_7_section:
        Polygon((CHAMFER2_SIZE * 0.999621916911, -CHAMFER2_SIZE * 0.0274958766106), (-CHAMFER2_SIZE * 0.0274958766106, -CHAMFER2_SIZE * 0.999621916911), (0, 0), align=None)
    chamfer2_piece_7 = extrude(amount=91.550163213, mode=Mode.PRIVATE)
    chamfer2_piece_7 = split(chamfer2_piece_7, bisect_by=Plane(origin=(1.672912206, 43.366191756, 15.770614439), z_dir=(0, 0.8637789008984335, -0.5038710255240861)), keep=Keep.TOP, mode=Mode.PRIVATE)
    add(chamfer2_piece_7, mode=Mode.SUBTRACT)


solid = part.part
